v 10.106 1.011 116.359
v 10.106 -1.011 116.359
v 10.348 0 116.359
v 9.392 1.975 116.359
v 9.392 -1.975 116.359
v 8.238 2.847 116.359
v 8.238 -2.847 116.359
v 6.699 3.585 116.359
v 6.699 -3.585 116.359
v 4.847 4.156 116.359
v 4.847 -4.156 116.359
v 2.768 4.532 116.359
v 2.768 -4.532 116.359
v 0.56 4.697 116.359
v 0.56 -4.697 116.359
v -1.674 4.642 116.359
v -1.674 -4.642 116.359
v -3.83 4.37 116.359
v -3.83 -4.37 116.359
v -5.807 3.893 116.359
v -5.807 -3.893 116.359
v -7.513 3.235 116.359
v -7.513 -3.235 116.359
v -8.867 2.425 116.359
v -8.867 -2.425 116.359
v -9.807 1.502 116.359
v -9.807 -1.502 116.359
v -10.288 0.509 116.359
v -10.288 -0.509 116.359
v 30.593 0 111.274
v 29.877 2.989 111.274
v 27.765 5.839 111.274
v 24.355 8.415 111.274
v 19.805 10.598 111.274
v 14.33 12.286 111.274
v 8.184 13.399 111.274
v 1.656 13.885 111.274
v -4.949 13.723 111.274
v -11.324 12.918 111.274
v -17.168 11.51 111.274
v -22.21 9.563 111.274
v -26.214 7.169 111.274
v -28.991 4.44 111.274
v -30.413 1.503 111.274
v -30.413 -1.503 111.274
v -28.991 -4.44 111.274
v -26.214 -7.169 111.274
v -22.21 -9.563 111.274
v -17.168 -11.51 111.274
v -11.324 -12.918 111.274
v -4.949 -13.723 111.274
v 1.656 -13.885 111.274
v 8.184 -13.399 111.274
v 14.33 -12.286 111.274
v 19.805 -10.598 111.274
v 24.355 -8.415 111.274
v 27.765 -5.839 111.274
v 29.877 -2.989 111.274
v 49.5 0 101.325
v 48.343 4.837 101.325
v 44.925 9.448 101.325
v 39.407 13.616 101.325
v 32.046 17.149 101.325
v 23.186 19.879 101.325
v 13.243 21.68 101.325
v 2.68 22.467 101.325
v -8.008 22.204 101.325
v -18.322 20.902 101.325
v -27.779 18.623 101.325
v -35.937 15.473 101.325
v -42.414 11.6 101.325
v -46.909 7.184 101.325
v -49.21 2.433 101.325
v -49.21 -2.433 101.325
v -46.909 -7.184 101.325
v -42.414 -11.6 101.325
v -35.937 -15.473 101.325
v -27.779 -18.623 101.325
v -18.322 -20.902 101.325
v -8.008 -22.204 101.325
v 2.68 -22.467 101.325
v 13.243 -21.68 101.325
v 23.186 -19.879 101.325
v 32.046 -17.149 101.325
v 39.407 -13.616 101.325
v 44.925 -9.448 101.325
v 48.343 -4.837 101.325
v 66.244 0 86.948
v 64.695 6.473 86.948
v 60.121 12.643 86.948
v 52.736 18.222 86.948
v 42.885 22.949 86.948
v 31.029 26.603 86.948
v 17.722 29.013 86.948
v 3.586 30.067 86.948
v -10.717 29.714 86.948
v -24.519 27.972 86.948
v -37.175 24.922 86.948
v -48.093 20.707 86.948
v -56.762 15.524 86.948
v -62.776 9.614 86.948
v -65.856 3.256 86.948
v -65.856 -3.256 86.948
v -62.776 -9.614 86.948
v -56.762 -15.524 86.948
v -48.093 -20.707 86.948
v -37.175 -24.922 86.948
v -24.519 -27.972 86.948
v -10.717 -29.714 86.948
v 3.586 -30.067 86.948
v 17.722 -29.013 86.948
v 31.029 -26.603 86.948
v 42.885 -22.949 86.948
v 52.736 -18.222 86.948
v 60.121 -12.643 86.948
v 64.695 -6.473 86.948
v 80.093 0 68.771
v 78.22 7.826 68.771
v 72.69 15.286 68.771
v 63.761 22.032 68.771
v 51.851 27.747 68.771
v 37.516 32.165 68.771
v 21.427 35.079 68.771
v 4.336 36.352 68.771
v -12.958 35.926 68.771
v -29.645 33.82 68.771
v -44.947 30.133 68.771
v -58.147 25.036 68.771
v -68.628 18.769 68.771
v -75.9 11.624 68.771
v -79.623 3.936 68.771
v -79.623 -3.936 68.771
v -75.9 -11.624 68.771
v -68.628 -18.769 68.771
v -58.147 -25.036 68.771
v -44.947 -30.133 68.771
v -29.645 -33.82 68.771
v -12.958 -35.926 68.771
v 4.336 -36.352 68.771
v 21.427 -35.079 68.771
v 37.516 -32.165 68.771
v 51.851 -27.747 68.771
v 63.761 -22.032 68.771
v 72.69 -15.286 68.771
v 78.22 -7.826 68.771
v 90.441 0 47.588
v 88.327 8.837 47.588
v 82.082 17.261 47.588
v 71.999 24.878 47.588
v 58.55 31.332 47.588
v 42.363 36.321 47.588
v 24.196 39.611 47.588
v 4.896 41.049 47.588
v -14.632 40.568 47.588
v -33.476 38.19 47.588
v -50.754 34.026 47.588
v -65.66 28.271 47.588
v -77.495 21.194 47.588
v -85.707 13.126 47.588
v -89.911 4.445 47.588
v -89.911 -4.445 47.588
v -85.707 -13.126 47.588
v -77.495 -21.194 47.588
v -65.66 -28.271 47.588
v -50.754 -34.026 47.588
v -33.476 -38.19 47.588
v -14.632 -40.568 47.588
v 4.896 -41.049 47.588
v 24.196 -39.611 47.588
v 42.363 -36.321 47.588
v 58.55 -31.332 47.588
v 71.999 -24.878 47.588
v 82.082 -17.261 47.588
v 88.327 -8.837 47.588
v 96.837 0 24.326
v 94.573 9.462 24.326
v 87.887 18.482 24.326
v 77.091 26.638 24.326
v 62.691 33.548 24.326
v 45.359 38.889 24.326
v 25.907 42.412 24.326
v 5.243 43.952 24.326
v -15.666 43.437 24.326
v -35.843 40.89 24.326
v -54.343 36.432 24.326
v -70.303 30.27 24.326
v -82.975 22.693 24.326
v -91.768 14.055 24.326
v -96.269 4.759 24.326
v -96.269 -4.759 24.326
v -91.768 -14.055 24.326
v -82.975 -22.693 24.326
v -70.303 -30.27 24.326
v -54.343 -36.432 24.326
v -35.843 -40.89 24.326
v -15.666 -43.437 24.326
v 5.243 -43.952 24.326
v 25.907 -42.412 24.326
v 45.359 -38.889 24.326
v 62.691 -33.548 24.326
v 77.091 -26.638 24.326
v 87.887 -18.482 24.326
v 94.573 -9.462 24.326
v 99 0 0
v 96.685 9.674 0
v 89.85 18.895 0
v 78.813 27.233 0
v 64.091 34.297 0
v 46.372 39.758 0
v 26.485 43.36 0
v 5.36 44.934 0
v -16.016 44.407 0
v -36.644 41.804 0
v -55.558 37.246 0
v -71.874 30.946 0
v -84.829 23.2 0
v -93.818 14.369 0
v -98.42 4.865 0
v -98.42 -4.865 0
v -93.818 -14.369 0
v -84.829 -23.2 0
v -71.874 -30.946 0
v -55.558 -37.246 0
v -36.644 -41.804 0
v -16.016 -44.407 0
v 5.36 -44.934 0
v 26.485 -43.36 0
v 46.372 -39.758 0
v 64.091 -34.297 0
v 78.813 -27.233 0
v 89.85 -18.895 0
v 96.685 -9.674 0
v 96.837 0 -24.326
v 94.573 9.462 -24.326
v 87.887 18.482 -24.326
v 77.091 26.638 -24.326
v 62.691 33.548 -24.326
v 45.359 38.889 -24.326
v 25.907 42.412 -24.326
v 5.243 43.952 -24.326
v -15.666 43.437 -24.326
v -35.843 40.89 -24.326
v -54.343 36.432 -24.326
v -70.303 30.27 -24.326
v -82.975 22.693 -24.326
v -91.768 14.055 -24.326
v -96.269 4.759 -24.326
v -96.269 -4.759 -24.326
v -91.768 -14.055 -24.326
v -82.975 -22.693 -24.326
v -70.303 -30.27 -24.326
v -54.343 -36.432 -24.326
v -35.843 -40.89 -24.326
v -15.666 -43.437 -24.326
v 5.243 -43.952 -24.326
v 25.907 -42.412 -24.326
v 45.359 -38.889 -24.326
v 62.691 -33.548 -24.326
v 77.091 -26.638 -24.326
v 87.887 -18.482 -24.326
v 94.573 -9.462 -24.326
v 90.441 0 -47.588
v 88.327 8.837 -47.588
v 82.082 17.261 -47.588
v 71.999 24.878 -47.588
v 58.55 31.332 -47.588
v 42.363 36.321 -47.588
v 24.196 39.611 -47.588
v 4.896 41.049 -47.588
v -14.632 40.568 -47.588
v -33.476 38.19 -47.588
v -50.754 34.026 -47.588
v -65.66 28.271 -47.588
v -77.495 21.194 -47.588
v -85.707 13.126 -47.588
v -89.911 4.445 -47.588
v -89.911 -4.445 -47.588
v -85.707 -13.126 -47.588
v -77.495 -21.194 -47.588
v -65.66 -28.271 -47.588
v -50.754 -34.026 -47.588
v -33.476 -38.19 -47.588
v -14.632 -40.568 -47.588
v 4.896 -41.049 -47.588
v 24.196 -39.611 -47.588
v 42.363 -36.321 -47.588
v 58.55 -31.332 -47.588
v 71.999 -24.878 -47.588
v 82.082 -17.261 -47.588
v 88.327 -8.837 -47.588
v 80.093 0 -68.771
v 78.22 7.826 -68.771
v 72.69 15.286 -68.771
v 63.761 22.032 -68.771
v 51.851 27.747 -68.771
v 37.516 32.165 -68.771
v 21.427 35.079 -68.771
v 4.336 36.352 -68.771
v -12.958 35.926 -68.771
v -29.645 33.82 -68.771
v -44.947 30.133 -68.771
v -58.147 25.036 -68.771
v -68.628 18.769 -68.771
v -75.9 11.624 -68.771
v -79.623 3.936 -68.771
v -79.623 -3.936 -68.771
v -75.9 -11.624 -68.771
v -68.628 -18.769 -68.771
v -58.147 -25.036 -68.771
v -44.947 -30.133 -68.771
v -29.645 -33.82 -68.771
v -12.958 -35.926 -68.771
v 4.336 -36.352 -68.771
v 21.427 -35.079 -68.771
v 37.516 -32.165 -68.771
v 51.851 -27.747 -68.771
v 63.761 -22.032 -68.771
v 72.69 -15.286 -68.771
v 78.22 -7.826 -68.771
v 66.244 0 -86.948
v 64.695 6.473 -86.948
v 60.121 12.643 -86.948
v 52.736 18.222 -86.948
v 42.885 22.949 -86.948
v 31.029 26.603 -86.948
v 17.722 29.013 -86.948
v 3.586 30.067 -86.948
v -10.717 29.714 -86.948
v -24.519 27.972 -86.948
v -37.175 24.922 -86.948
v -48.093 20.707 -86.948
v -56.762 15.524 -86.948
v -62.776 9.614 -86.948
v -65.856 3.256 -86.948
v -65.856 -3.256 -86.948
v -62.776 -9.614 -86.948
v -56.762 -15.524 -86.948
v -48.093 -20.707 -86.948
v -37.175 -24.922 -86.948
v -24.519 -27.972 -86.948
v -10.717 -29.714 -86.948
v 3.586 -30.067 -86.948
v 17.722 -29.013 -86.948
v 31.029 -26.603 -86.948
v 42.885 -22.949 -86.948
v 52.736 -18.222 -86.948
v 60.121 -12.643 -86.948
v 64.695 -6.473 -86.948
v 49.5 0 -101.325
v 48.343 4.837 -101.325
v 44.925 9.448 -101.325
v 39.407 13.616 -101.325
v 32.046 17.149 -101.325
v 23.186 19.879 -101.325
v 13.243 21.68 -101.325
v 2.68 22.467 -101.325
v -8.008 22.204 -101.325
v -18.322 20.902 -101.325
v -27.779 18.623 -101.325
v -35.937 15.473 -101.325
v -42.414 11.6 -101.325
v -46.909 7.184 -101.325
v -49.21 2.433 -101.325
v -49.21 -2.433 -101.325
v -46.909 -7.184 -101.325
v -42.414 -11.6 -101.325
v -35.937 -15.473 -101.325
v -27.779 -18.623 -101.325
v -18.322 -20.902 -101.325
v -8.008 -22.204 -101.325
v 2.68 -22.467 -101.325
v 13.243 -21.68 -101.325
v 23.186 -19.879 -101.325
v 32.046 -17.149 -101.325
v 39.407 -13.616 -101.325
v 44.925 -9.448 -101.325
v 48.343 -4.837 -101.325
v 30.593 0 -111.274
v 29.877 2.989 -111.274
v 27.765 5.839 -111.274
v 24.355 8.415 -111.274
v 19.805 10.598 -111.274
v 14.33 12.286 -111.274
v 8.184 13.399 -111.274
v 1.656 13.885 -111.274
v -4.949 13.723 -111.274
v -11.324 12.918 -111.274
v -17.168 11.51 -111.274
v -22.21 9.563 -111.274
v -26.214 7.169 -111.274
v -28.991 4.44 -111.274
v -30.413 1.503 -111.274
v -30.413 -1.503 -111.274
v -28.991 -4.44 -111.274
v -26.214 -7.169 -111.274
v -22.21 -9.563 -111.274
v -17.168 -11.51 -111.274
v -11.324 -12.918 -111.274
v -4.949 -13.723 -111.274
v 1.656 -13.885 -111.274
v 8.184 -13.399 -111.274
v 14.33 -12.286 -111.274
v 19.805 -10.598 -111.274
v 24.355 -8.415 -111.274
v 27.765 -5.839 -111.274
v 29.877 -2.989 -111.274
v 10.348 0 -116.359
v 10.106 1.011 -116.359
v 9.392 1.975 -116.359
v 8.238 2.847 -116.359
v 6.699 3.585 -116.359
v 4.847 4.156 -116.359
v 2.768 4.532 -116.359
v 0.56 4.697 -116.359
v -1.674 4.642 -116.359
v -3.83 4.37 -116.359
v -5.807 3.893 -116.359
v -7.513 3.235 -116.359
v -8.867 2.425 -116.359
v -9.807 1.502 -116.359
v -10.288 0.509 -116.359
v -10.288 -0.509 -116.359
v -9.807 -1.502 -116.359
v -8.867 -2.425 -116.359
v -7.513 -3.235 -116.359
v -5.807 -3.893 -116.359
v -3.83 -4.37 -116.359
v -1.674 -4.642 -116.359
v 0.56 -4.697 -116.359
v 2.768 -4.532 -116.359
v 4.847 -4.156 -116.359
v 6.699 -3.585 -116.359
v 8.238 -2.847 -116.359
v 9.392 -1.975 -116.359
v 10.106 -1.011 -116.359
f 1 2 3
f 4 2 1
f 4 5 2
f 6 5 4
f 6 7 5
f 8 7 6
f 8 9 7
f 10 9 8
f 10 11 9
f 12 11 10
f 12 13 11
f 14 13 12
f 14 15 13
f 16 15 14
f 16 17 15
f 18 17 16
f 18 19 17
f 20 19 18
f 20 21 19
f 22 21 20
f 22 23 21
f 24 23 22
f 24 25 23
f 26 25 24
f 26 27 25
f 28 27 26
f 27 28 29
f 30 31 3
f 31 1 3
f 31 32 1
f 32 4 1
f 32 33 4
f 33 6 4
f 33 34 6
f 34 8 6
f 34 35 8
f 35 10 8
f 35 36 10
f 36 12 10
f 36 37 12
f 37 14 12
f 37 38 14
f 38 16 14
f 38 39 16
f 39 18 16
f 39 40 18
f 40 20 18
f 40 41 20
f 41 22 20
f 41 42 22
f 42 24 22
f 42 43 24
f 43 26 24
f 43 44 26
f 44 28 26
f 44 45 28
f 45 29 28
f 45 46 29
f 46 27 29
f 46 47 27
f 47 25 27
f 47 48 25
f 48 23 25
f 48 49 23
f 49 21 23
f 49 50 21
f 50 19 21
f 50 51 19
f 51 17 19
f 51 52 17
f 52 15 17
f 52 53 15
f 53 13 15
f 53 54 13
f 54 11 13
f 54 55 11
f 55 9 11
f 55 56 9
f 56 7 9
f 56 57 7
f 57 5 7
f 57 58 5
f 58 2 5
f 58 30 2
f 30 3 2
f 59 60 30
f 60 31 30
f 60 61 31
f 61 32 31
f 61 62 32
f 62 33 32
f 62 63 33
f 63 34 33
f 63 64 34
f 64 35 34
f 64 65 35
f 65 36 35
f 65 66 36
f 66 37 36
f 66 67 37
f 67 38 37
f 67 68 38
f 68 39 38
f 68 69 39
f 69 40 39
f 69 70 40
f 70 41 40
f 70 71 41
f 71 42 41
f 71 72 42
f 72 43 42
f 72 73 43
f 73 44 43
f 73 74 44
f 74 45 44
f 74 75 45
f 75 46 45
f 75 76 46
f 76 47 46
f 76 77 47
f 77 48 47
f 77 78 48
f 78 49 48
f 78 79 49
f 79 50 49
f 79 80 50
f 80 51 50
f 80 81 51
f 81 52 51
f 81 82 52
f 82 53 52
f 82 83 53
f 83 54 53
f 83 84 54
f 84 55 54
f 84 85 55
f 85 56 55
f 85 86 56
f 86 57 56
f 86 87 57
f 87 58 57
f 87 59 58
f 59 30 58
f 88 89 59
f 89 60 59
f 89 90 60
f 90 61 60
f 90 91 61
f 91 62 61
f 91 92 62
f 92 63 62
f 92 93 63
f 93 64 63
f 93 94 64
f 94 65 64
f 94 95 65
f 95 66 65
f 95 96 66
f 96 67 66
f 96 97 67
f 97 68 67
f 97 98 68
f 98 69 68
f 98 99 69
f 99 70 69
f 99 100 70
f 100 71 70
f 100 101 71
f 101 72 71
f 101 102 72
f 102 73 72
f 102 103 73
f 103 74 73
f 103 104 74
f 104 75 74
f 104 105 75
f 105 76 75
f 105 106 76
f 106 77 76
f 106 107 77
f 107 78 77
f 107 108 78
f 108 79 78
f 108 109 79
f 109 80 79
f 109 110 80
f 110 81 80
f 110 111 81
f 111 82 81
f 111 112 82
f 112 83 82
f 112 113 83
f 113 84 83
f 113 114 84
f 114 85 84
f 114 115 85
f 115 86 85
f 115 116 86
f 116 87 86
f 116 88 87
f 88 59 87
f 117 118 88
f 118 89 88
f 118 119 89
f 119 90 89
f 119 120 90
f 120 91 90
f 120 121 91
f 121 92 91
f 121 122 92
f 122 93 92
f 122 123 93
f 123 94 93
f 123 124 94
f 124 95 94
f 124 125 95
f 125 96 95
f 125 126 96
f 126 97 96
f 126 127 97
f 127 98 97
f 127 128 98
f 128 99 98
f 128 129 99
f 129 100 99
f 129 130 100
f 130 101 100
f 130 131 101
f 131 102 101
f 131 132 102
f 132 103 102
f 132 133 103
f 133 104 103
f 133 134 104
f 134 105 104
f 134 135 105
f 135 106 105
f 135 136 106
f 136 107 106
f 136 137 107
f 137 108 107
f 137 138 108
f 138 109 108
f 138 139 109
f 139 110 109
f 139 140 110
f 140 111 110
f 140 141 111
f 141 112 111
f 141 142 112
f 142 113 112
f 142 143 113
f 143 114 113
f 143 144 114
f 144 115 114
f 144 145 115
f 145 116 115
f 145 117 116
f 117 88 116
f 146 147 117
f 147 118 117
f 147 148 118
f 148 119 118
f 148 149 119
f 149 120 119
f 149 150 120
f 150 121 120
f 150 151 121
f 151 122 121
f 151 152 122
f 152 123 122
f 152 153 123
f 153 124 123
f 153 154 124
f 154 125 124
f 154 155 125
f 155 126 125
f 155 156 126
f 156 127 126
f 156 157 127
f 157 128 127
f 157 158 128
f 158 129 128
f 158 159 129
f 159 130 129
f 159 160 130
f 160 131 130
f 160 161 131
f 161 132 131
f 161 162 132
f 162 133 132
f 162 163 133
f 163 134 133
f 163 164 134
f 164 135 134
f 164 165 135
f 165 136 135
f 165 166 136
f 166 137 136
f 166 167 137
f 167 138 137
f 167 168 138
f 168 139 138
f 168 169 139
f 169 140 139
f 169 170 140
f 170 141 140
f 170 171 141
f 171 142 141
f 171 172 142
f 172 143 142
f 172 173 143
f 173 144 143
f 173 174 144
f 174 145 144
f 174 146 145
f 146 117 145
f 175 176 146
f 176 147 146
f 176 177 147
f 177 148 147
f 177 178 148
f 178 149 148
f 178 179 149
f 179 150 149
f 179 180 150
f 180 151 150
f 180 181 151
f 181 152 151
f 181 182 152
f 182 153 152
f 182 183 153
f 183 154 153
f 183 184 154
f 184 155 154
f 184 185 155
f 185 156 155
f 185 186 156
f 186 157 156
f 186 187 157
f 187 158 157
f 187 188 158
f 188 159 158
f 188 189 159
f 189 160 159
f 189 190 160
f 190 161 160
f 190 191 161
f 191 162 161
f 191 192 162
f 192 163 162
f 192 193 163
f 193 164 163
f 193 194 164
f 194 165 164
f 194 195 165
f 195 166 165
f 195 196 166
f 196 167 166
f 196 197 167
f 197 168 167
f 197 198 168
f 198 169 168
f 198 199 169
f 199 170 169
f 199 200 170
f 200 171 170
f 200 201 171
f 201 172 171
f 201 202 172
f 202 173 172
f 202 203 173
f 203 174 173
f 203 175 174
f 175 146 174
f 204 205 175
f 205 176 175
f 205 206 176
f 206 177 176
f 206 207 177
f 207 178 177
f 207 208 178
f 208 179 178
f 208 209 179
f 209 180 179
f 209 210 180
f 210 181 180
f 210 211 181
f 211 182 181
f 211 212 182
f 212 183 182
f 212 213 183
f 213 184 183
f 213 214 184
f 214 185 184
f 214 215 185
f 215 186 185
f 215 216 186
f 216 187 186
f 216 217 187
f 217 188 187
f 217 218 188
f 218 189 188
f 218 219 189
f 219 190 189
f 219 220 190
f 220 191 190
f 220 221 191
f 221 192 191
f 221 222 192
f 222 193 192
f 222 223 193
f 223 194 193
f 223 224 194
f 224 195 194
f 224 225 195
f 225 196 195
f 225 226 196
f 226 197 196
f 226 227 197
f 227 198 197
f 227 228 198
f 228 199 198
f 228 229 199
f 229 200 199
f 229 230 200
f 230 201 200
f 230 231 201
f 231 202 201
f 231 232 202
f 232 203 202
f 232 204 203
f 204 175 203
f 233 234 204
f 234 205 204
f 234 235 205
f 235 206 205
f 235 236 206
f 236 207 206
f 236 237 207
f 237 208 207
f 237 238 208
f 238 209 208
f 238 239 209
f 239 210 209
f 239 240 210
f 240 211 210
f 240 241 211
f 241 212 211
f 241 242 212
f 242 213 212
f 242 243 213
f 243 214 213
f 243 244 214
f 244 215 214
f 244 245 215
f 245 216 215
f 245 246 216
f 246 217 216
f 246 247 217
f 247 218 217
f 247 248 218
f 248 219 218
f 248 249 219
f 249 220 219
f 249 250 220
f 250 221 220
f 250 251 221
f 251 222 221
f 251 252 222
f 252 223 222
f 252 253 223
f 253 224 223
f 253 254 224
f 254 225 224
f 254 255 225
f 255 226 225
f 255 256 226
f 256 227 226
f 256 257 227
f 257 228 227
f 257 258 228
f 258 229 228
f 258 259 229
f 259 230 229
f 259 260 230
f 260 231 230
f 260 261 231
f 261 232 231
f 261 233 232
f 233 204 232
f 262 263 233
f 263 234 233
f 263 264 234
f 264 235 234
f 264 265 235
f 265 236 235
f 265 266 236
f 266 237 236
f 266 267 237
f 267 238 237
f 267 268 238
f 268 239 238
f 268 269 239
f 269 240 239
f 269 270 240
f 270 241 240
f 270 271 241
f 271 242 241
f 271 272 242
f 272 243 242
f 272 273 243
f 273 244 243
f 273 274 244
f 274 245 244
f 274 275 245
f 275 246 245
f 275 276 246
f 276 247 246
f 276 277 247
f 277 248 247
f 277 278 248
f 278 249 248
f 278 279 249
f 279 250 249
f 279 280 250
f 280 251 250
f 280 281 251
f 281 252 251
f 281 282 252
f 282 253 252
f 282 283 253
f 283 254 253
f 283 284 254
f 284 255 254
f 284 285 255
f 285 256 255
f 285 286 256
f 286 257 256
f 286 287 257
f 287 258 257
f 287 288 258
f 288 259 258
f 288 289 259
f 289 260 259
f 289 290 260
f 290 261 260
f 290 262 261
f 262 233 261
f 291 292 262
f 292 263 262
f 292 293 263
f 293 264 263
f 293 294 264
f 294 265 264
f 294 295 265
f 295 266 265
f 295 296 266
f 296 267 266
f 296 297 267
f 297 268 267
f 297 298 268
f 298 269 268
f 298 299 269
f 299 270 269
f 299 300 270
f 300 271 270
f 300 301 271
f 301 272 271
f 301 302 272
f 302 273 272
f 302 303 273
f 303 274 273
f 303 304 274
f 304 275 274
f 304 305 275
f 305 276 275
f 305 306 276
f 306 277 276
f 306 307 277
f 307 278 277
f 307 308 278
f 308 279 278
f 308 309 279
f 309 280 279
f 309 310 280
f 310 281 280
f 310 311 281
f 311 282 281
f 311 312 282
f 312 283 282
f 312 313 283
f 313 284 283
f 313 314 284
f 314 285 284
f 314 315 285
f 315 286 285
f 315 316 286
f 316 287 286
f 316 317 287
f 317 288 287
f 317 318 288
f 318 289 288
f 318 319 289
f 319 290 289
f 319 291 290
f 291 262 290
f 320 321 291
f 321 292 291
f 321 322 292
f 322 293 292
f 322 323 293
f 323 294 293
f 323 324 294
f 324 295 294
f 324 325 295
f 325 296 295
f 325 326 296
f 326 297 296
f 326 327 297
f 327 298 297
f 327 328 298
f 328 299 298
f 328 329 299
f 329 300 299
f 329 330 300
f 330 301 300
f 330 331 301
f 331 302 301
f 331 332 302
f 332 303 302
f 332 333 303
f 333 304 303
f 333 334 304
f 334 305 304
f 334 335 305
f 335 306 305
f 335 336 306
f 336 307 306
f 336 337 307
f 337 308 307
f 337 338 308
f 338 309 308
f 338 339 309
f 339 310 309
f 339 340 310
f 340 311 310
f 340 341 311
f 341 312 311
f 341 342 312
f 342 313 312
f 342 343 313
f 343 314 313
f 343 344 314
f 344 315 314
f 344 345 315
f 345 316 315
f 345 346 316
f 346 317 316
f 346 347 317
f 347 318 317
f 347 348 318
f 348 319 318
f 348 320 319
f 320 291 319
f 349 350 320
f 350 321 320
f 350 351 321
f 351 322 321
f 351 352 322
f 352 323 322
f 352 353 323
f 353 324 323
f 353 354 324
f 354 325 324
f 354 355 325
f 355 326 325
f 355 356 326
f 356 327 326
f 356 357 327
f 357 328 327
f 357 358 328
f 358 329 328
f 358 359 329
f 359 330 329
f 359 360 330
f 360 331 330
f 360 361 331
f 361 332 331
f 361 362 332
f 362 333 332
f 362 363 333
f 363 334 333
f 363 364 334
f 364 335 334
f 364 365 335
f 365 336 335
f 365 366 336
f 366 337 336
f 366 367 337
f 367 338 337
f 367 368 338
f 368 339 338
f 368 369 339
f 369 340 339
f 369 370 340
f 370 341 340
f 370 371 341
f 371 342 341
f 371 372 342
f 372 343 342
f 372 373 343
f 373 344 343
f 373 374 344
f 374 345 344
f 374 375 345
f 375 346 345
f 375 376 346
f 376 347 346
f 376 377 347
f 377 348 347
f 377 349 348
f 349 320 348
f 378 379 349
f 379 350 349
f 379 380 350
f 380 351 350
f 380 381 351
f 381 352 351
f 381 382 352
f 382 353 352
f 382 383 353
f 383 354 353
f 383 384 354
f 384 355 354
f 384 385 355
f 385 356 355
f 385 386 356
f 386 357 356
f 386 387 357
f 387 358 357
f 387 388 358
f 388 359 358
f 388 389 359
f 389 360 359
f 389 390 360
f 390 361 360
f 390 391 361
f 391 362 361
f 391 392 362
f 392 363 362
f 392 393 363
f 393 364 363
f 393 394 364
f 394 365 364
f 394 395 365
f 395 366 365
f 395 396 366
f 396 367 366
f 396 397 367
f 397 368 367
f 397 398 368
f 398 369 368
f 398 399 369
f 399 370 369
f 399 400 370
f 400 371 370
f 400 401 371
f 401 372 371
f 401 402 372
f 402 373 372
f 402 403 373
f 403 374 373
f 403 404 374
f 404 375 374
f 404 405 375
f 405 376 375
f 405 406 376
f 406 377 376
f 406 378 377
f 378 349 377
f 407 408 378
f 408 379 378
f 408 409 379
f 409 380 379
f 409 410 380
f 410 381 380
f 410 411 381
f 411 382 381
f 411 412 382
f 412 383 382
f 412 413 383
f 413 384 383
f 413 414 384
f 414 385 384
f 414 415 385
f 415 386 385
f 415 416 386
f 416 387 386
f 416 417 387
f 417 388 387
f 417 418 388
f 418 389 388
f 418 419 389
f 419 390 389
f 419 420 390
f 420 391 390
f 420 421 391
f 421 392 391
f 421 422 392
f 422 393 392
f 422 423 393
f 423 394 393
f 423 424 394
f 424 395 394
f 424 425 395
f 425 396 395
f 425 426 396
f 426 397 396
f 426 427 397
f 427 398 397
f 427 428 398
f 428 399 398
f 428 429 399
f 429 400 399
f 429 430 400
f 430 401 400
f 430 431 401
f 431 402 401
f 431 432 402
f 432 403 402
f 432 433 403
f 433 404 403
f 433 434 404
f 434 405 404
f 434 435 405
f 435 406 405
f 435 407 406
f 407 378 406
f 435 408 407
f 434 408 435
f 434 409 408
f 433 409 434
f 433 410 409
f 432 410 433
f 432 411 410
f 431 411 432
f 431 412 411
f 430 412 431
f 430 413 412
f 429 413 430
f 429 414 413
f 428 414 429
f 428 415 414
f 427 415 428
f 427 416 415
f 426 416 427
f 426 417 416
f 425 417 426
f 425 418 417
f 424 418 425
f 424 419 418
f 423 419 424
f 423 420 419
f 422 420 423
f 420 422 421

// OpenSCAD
// Generated by SolidPython 1.0.1 on 2020-07-29 00:46:49


scale(v = [11, 5, 13]) {
	sphere(r = 9);
}
/***********************************************
*********      SolidPython code:      **********
************************************************
 
# import packages: SolidPython
from solid import *
from solid.utils import *
from itertools import chain, combinations, permutations


class Resize:

    def __init__(self, scad_file):
        self.scad_file = scad_file
        #self.scad_file = import_scad(scad_file)
        # cone/cylinder param:
        self.r1 = 0
        self.r2 = 0
        self.h = 0
        # rectangular prism param:
        self.w = 0
        self.l = 0
        # ellipse param:
        self.r = 0

    # import OpenScad code (file name corresponds to shape)


    # classify shape + parameters
    def assign(self, param1, param2, param3):
        if self.scad_file == 'cone.scad':
            self.r1 = param1
            self.r2 = param2
            self.h = param3
        elif self.scad_file == 'cylinder.scad':
            self.r1 = param1
            self.r2 = param2
            self.h = param3
        elif self.scad_file == 'rectangularPrism.scad':
            self.h = param1
            self.l = param2
            self.w = param3
        else:
            self.r = param1
            self.h = param2

    # resize parameters
    def iterate(self):
        x = range(3, 20, 2)
        i = 1
        if self.scad_file == 'cone.scad':
            tempList = list(permutations(x, 2))
            for temp in tempList:
                param1 = temp[0]
                param2 = temp[1]
                filepath = 'produced_scad_files/' + 'cone' + str(param1) + '_' + str(param2) + '_' + '.scad'
                scad_render_to_file(cylinder(h=param1, r1=param2, r2=0), filepath)

        elif self.scad_file == 'cylinder.scad':
            tempList = list(permutations(x, 3))
            for temp in tempList:
                param1 = temp[0]
                param2 = temp[1]
                filepath = 'produced_scad_files/' + 'cylinder' + str(param1) + '_' + str(param2) + '_' + '.scad'
                scad_render_to_file(cylinder(h=param1, r1=param2, r2=param2), filepath)

        elif self.scad_file == 'rectangularPrism.scad':
            tempList = list(permutations(x, 3))
            for temp in tempList:
                param1 = temp[0]
                param2 = temp[1]
                param3 = temp[2]
                filepath = 'produced_scad_files/' + 'rectangularPrism' + str(param1) + '_' + str(param2) + '_' + str(
                    param3) + '.scad'
                scad_render_to_file(cube(size=(param1, param2, param3)), filepath)

        elif self.scad_file == 'ellipse.scad':
            tempList = list(permutations(x, 4))
            for temp in tempList:
                param1 = temp[0]
                param2 = temp[1]
                param3 = temp[2]
                param4 = temp[3]
                filepath = 'produced_scad_files/' + 'ellipse' + str(param1) + '_' + str(param2) + '_' + str(param3) + '_' + str(param4) + '.scad'
                scad_render_to_file(scale([param1, param2, param3])(sphere(r=param4)), filepath)

    def render_to_scadfile(self):
        scad_render_to_file(scad, 'example.scad') 
 
************************************************/
